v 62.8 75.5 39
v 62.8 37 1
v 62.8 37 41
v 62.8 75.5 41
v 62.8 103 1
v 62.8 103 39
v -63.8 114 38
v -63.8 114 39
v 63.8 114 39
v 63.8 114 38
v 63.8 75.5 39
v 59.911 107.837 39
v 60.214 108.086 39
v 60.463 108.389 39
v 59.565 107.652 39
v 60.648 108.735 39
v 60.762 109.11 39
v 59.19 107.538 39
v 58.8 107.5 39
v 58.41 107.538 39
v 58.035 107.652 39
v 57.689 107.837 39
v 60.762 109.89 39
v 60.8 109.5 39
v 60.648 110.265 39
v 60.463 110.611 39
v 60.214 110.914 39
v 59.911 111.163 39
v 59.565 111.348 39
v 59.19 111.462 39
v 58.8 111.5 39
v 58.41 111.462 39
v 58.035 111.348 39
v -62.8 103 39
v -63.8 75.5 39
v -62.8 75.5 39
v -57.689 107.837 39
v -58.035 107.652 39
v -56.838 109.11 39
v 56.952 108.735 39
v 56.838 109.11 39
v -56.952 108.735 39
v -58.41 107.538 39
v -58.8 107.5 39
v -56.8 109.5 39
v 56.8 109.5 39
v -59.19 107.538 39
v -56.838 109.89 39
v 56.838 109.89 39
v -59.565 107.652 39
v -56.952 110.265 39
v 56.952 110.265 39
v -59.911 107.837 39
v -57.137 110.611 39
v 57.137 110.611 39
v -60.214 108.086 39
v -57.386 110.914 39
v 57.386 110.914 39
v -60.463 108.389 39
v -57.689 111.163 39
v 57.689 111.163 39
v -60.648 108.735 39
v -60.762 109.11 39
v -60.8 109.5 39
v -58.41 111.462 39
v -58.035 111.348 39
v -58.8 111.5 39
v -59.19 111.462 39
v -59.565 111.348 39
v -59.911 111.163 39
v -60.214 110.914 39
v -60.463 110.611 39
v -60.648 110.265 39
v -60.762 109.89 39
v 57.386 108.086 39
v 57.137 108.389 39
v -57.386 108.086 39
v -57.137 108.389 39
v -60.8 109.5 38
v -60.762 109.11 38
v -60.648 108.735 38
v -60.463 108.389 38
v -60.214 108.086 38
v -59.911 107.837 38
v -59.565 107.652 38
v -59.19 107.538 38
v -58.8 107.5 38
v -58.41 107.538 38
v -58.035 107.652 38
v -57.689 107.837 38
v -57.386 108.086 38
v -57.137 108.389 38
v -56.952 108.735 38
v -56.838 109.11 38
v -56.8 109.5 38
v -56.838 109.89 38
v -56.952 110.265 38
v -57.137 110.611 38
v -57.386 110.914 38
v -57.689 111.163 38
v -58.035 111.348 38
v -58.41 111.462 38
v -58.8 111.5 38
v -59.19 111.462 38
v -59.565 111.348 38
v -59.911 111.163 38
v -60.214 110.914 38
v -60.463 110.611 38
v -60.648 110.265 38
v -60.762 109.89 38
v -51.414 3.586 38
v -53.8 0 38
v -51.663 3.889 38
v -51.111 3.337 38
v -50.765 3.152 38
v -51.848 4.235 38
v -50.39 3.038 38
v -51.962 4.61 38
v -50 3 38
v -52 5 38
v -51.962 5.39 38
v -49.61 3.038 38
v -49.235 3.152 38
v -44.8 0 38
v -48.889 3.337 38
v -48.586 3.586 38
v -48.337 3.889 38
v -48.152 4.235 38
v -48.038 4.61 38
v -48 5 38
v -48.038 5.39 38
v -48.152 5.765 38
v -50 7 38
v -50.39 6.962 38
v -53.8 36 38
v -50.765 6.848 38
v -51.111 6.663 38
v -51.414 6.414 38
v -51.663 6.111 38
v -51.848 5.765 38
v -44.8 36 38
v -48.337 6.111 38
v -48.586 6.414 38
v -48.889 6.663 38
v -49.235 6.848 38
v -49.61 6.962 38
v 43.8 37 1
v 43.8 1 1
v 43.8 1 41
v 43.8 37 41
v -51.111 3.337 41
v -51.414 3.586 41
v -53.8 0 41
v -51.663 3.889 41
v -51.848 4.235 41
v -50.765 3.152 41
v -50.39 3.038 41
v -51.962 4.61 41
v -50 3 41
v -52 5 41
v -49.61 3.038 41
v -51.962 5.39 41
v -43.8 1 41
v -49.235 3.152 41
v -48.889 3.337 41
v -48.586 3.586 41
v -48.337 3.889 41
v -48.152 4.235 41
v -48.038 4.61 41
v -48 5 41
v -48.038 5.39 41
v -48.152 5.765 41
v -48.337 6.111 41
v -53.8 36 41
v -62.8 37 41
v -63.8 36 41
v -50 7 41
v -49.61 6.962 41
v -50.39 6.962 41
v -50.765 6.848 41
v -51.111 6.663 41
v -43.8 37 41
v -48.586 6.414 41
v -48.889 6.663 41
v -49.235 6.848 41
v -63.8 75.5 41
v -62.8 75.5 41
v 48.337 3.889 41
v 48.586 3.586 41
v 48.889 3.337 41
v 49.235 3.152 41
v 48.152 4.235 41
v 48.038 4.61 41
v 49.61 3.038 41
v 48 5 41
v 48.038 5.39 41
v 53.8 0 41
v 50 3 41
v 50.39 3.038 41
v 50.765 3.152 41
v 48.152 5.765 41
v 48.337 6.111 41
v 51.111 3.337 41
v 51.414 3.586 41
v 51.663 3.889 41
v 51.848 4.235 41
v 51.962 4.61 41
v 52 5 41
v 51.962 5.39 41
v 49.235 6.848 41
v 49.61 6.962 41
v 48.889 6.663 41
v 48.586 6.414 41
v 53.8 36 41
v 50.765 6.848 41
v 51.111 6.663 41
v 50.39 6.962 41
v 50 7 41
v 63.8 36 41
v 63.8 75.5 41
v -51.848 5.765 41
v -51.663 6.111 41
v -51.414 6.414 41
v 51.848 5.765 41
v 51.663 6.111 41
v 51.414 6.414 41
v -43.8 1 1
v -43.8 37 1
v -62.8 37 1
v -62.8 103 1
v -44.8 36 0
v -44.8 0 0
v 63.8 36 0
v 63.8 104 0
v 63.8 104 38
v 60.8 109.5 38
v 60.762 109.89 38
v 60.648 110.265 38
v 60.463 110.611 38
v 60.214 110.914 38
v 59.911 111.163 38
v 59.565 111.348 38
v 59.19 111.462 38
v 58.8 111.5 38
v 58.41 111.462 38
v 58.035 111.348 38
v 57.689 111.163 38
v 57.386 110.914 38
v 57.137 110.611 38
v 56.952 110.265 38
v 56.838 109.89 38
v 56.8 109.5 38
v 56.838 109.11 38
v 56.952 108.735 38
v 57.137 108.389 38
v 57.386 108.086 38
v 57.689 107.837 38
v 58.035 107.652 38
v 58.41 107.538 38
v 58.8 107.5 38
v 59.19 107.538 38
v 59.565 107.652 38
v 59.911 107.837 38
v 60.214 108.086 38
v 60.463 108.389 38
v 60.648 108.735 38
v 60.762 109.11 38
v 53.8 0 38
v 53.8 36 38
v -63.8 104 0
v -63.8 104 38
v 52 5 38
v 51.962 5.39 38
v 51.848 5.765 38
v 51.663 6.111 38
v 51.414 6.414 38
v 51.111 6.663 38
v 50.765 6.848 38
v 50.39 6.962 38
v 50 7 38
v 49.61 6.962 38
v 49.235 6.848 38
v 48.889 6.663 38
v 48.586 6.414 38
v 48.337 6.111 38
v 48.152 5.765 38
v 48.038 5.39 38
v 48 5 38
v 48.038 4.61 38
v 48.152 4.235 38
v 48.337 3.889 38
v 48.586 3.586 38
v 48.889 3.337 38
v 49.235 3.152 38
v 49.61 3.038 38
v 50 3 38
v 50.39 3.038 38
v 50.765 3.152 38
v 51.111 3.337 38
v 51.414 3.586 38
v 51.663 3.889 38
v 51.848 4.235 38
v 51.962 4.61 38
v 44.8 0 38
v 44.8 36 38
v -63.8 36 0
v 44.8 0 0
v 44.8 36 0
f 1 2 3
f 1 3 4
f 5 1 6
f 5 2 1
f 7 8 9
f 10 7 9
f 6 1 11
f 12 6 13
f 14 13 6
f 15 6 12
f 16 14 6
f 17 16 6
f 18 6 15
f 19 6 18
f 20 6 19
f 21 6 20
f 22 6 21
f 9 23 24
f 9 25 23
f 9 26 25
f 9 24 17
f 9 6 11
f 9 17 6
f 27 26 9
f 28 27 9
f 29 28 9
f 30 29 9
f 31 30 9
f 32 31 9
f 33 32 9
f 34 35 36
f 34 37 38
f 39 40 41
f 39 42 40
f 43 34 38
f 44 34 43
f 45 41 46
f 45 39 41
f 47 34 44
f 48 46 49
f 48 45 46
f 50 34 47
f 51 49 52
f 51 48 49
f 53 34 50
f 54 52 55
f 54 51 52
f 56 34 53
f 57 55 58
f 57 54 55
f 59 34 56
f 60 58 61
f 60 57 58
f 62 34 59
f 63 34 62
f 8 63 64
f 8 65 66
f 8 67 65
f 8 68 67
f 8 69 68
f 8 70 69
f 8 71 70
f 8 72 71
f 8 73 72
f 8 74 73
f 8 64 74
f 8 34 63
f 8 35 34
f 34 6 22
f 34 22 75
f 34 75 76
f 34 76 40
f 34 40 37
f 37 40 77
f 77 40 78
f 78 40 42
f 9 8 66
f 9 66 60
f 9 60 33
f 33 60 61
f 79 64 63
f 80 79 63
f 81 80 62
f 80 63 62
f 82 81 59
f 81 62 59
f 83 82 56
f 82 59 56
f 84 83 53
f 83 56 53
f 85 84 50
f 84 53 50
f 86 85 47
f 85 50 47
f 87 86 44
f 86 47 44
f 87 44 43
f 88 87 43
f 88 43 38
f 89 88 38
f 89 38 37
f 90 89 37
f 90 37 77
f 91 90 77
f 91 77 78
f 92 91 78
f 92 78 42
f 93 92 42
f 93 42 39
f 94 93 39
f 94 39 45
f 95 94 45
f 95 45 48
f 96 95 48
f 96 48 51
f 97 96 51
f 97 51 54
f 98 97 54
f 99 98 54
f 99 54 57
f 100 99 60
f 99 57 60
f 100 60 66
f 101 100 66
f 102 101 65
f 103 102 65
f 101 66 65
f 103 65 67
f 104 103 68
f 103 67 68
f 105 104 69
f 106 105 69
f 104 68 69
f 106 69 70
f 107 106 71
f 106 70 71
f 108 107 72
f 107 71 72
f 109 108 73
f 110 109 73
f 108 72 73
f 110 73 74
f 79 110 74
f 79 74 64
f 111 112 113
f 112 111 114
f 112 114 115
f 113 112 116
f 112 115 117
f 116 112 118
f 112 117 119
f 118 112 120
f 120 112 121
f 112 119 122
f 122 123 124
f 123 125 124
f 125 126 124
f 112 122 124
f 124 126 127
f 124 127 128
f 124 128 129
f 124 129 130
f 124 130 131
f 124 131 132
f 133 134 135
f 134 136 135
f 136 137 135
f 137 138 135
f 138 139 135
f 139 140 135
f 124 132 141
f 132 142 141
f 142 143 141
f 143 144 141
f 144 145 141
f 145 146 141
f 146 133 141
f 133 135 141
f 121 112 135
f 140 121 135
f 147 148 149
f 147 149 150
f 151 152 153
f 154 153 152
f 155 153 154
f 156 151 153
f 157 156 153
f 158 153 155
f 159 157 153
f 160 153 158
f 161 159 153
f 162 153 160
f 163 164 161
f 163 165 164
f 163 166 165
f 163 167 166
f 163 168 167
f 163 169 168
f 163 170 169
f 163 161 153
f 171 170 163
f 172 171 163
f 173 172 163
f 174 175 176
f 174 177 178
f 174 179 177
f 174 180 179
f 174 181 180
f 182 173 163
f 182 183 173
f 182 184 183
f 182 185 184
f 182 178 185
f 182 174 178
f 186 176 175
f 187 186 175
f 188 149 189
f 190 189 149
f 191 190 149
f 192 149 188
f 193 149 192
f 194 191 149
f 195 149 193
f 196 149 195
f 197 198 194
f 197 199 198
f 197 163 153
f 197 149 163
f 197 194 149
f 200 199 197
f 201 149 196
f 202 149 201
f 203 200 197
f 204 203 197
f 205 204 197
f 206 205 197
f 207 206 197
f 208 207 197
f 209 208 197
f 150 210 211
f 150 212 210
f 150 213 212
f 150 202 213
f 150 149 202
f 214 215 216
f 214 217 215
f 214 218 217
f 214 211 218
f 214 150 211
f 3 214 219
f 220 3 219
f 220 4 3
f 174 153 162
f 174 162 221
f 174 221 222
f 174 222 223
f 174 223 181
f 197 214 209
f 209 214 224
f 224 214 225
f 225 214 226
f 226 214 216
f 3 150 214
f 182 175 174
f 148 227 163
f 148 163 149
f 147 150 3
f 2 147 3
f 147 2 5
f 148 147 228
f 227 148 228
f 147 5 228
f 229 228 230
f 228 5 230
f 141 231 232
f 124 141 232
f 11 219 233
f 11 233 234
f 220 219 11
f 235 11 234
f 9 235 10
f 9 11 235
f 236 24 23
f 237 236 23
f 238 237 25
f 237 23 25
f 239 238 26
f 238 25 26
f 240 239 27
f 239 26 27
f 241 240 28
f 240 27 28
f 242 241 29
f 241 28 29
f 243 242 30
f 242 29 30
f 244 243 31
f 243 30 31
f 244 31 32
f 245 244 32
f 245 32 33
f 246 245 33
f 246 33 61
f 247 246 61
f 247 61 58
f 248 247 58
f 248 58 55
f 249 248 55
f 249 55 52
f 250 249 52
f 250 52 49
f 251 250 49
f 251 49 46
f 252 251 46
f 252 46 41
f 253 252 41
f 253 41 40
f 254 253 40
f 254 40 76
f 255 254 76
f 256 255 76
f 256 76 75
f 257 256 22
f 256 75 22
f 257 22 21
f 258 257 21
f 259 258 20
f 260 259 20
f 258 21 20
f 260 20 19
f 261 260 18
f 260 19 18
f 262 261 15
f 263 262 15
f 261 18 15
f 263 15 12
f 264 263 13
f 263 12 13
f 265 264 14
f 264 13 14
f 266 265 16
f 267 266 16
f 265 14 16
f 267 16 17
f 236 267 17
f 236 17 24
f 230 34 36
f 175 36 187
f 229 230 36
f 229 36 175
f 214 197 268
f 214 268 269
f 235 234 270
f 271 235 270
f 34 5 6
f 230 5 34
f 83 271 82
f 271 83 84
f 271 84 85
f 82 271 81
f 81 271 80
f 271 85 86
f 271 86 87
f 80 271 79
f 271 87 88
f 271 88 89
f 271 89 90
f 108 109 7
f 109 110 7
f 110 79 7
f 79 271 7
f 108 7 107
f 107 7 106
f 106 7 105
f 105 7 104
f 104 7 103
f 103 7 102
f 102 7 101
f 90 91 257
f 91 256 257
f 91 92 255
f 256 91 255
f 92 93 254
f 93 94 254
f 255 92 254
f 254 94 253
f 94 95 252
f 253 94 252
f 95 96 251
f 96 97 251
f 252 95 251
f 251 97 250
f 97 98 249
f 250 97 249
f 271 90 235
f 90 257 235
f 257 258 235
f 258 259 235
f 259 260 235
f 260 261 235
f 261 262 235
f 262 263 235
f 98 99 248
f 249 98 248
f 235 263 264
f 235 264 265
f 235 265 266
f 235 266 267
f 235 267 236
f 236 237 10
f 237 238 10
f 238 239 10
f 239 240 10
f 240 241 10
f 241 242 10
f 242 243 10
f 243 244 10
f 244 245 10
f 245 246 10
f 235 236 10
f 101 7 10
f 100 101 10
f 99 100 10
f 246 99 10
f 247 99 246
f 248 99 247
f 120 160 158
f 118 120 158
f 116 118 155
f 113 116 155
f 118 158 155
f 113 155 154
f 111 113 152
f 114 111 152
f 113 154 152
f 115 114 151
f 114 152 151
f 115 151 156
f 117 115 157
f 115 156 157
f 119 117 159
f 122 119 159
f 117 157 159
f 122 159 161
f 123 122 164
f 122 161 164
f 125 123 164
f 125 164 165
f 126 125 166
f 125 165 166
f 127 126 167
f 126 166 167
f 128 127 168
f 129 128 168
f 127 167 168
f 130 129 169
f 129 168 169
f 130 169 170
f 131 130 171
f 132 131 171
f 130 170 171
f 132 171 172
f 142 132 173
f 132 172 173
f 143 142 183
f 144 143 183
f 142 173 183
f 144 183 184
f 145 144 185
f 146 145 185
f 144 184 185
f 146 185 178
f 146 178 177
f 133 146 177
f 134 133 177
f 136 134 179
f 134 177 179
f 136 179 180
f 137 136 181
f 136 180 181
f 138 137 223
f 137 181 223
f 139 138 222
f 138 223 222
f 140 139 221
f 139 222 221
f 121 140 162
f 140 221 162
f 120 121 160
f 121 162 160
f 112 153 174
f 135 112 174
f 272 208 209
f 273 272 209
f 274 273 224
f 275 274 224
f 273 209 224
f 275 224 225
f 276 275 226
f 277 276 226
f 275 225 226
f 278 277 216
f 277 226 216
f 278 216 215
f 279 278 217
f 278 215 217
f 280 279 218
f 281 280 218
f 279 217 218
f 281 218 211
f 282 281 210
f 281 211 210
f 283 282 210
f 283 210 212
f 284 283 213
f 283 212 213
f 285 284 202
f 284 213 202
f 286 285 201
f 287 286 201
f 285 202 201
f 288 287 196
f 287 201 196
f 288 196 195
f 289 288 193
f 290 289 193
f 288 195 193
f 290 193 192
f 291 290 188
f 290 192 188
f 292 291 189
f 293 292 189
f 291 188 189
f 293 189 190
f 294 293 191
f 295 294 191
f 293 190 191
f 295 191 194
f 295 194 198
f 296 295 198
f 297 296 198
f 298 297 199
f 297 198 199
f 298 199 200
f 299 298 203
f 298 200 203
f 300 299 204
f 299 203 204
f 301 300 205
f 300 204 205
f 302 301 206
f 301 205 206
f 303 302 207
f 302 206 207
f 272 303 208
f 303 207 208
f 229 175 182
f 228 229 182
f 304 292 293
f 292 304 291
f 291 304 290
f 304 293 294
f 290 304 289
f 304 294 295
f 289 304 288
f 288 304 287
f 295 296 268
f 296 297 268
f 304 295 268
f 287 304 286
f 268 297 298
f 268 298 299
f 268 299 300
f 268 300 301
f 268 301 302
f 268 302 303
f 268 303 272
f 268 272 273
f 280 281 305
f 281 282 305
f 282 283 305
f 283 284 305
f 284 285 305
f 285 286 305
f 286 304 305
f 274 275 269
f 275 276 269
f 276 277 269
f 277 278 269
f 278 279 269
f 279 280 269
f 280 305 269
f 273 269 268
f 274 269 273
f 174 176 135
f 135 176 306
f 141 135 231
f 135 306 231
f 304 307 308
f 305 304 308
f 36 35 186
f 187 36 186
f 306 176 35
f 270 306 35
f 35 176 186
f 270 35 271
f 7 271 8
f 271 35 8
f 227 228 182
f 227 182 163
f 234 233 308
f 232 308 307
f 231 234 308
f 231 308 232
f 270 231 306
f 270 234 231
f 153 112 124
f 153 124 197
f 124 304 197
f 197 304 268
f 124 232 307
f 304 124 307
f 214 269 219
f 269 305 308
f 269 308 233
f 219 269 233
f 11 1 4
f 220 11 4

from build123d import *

# Parameters (mm, degrees)
EXTRUDE_1_DEPTH     = 1
EXTRUDE_2_DEPTH     = 40
SKETCH_3_W          = 127.6
SKETCH_3_H          = 10
SKETCH_3_R          = 2
SKETCH_3_W_2        = 10
SKETCH_3_H_2        = 37
EXTRUDE_3_DEPTH     = 3
SKETCH_4_W          = 2
SKETCH_4_H          = 38.5
CUT_EXTRUDE_1_DEPTH = 176.951015911


with BuildPart() as part:
    # 草图1 → 凸台-拉伸1 (new body)
    with BuildSketch(Plane.XY):
        Polygon((-63.8, 104), (63.8, 104), (63.8, 36), (44.8, 36), (44.8, 0), (-44.8, 0), (-44.8, 36), (-63.8, 36), align=None)
    extrude(amount=EXTRUDE_1_DEPTH)

    # 草图2 → 凸台-拉伸2 (add)
    with BuildSketch(Plane.XY.offset(1)):
        Polygon((-44.8, 36), (-44.8, 0), (44.8, 0), (44.8, 36), (63.8, 36), (63.8, 104), (-63.8, 104), (-63.8, 36), align=None)
        Polygon((62.8, 103), (-62.8, 103), (-62.8, 37), (-43.8, 37), (-43.8, 1), (43.8, 1), (43.8, 37), (62.8, 37), align=None, mode=Mode.SUBTRACT)
    extrude(amount=EXTRUDE_2_DEPTH)

    # 草图3 → 凸台-拉伸3 (add)
    # profile 1 of 3: a face of its own
    with BuildSketch(Plane.XY.offset(41)):
        with Locations((0, 109)):
            Rectangle(SKETCH_3_W, SKETCH_3_H)
        with Locations((58.8, 109.5)):
            Circle(SKETCH_3_R, mode=Mode.SUBTRACT)
        with Locations(Location((-58.8, 109.5, 0), (0, 0, 180))):
            Circle(SKETCH_3_R, mode=Mode.SUBTRACT)
    # profile 2 of 3: a face of its own
    with BuildSketch(Plane.XY.offset(41)):
        with Locations((48.8, 18.5)):
            Rectangle(SKETCH_3_W_2, SKETCH_3_H_2)
        with Locations((50, 5)):
            Circle(SKETCH_3_R, mode=Mode.SUBTRACT)
    # profile 3 of 3: a face of its own
    with BuildSketch(Plane.XY.offset(41)):
        with Locations((-48.8, 18.5)):
            Rectangle(SKETCH_3_W_2, SKETCH_3_H_2)
        with Locations(Location((-50, 5, 0), (0, 0, 180))):
            Circle(SKETCH_3_R, mode=Mode.SUBTRACT)
    extrude(amount=-EXTRUDE_3_DEPTH)

    # 草图4 → 切除-拉伸1 (cut, through all)
    with BuildSketch(Plane.ZY.offset(63.8)):
        with Locations((40, 94.75)):
            Rectangle(SKETCH_4_W, SKETCH_4_H)
    extrude(amount=-CUT_EXTRUDE_1_DEPTH, mode=Mode.SUBTRACT)


solid = part.part
